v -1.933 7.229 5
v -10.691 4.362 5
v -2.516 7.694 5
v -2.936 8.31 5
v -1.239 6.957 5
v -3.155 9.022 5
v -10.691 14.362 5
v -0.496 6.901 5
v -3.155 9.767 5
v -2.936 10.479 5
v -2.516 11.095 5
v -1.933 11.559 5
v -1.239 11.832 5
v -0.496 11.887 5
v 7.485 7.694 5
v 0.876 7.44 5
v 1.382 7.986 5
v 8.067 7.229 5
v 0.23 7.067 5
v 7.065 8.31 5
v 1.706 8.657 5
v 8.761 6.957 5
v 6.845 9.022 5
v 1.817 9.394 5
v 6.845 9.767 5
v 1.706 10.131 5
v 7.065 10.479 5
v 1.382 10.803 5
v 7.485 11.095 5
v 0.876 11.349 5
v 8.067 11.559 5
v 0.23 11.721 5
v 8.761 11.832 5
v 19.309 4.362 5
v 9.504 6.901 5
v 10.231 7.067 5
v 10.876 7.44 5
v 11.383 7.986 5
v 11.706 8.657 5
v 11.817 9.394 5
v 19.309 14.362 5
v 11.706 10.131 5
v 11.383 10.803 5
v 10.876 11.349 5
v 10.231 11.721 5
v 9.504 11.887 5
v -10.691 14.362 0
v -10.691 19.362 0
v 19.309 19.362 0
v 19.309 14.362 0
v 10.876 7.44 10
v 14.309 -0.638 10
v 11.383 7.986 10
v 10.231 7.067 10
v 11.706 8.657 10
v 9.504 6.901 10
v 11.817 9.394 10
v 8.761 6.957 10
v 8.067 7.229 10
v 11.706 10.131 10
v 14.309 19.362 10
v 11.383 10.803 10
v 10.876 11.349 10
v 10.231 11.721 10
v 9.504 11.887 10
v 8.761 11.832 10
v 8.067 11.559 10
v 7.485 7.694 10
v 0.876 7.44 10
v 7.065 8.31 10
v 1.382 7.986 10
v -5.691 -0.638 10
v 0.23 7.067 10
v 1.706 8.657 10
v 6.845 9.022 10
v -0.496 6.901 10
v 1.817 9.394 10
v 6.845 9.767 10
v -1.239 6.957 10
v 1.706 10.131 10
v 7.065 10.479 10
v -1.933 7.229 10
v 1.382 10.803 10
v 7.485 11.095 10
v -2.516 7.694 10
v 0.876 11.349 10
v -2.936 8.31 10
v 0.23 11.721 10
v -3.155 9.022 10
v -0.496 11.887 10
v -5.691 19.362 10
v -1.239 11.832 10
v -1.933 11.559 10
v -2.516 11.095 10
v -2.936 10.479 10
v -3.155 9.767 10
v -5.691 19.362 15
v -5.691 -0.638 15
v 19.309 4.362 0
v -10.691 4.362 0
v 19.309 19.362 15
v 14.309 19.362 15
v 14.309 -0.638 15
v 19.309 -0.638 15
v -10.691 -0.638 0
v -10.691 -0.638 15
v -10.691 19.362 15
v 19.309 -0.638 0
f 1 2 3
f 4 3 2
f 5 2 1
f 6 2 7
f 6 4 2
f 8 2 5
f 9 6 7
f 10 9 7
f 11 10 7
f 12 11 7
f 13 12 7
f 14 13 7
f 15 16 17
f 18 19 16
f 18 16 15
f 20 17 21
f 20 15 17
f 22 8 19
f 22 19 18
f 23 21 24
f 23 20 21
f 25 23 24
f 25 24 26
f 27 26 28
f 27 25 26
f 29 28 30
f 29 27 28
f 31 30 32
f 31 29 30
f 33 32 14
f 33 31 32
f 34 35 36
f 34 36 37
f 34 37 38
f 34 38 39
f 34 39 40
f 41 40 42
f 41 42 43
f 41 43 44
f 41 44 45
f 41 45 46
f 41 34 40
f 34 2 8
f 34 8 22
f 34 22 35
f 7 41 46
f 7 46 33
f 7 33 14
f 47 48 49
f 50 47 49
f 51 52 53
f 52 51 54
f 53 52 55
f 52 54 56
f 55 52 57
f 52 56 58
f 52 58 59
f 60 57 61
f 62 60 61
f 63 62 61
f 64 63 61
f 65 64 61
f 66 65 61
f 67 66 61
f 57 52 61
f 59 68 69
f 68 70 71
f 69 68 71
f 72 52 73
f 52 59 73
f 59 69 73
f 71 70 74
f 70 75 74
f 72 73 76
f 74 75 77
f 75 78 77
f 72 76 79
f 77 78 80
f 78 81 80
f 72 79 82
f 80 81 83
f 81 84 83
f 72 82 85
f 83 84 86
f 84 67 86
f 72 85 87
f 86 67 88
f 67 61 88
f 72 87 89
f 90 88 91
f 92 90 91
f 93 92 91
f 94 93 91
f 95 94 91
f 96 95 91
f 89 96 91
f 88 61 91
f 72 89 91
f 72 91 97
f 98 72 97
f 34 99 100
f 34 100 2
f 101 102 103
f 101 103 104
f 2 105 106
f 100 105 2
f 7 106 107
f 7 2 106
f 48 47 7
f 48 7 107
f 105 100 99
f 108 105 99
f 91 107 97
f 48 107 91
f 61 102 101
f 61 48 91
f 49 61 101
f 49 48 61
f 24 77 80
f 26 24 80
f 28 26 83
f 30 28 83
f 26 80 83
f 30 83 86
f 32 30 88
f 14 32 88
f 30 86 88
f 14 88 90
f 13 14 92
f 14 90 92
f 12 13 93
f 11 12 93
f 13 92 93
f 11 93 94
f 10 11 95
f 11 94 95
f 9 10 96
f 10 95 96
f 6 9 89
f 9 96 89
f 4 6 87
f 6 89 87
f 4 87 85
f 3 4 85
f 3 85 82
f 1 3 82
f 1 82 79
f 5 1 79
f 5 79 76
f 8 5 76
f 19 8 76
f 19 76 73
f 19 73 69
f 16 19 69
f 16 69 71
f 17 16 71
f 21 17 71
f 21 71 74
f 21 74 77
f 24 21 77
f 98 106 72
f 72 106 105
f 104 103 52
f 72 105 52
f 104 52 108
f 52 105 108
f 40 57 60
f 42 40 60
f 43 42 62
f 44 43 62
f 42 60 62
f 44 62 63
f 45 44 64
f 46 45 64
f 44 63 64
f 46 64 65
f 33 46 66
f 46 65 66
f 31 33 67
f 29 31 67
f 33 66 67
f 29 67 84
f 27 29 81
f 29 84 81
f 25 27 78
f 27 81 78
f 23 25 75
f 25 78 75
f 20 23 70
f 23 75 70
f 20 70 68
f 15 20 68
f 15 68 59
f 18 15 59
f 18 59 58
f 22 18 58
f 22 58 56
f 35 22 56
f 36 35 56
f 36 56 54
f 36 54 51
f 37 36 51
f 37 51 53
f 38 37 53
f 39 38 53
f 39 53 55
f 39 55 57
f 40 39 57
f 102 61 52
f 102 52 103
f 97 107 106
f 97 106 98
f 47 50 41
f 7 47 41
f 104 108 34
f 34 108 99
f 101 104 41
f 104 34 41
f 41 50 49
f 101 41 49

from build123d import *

# Parameters (mm, degrees)
F0_W     = 30
F0_H     = 20
F1_DEPTH = 15
F2_W     = 10
F2_H     = 5
F3_DEPTH = 30.001
F4_W     = 20
F4_H     = 5
F5_DEPTH = 20.001
F7_R     = 2.5
F8_DEPTH = 10.001


with BuildPart() as f1:
    # F0 (on Top) → F1 (new body)
    with BuildSketch(Plane.XY):
        with Locations((4.308961, 9.361647)):
            Rectangle(F0_W, F0_H)
    extrude(amount=F1_DEPTH)

    # F2 (on face) → F3 (cut, through all)
    with BuildSketch(Plane.YZ.offset(19.308961)):
        with Locations((9.361647, 2.5)):
            Rectangle(F2_W, F2_H)
    extrude(amount=-F3_DEPTH, mode=Mode.SUBTRACT)

    # F4 (on face) → F5 (cut, through all)
    with BuildSketch(Plane(origin=(0, 19.361647, 0), x_dir=(-1, 0, 0), z_dir=(0, 1, 0))):
        with Locations((-4.308961, 12.5)):
            Rectangle(F4_W, F4_H)
    extrude(amount=-F5_DEPTH, mode=Mode.SUBTRACT)

    # F7 (on face) → F8 (cut, through all)
    with BuildSketch(Plane.XY.offset(10)):
        with Locations((-0.683151, 9.394292)):
            Circle(F7_R)
        with Locations((9.317168, 9.394293)):
            Circle(F7_R)
    extrude(amount=-F8_DEPTH, mode=Mode.SUBTRACT)


solid = f1.part
